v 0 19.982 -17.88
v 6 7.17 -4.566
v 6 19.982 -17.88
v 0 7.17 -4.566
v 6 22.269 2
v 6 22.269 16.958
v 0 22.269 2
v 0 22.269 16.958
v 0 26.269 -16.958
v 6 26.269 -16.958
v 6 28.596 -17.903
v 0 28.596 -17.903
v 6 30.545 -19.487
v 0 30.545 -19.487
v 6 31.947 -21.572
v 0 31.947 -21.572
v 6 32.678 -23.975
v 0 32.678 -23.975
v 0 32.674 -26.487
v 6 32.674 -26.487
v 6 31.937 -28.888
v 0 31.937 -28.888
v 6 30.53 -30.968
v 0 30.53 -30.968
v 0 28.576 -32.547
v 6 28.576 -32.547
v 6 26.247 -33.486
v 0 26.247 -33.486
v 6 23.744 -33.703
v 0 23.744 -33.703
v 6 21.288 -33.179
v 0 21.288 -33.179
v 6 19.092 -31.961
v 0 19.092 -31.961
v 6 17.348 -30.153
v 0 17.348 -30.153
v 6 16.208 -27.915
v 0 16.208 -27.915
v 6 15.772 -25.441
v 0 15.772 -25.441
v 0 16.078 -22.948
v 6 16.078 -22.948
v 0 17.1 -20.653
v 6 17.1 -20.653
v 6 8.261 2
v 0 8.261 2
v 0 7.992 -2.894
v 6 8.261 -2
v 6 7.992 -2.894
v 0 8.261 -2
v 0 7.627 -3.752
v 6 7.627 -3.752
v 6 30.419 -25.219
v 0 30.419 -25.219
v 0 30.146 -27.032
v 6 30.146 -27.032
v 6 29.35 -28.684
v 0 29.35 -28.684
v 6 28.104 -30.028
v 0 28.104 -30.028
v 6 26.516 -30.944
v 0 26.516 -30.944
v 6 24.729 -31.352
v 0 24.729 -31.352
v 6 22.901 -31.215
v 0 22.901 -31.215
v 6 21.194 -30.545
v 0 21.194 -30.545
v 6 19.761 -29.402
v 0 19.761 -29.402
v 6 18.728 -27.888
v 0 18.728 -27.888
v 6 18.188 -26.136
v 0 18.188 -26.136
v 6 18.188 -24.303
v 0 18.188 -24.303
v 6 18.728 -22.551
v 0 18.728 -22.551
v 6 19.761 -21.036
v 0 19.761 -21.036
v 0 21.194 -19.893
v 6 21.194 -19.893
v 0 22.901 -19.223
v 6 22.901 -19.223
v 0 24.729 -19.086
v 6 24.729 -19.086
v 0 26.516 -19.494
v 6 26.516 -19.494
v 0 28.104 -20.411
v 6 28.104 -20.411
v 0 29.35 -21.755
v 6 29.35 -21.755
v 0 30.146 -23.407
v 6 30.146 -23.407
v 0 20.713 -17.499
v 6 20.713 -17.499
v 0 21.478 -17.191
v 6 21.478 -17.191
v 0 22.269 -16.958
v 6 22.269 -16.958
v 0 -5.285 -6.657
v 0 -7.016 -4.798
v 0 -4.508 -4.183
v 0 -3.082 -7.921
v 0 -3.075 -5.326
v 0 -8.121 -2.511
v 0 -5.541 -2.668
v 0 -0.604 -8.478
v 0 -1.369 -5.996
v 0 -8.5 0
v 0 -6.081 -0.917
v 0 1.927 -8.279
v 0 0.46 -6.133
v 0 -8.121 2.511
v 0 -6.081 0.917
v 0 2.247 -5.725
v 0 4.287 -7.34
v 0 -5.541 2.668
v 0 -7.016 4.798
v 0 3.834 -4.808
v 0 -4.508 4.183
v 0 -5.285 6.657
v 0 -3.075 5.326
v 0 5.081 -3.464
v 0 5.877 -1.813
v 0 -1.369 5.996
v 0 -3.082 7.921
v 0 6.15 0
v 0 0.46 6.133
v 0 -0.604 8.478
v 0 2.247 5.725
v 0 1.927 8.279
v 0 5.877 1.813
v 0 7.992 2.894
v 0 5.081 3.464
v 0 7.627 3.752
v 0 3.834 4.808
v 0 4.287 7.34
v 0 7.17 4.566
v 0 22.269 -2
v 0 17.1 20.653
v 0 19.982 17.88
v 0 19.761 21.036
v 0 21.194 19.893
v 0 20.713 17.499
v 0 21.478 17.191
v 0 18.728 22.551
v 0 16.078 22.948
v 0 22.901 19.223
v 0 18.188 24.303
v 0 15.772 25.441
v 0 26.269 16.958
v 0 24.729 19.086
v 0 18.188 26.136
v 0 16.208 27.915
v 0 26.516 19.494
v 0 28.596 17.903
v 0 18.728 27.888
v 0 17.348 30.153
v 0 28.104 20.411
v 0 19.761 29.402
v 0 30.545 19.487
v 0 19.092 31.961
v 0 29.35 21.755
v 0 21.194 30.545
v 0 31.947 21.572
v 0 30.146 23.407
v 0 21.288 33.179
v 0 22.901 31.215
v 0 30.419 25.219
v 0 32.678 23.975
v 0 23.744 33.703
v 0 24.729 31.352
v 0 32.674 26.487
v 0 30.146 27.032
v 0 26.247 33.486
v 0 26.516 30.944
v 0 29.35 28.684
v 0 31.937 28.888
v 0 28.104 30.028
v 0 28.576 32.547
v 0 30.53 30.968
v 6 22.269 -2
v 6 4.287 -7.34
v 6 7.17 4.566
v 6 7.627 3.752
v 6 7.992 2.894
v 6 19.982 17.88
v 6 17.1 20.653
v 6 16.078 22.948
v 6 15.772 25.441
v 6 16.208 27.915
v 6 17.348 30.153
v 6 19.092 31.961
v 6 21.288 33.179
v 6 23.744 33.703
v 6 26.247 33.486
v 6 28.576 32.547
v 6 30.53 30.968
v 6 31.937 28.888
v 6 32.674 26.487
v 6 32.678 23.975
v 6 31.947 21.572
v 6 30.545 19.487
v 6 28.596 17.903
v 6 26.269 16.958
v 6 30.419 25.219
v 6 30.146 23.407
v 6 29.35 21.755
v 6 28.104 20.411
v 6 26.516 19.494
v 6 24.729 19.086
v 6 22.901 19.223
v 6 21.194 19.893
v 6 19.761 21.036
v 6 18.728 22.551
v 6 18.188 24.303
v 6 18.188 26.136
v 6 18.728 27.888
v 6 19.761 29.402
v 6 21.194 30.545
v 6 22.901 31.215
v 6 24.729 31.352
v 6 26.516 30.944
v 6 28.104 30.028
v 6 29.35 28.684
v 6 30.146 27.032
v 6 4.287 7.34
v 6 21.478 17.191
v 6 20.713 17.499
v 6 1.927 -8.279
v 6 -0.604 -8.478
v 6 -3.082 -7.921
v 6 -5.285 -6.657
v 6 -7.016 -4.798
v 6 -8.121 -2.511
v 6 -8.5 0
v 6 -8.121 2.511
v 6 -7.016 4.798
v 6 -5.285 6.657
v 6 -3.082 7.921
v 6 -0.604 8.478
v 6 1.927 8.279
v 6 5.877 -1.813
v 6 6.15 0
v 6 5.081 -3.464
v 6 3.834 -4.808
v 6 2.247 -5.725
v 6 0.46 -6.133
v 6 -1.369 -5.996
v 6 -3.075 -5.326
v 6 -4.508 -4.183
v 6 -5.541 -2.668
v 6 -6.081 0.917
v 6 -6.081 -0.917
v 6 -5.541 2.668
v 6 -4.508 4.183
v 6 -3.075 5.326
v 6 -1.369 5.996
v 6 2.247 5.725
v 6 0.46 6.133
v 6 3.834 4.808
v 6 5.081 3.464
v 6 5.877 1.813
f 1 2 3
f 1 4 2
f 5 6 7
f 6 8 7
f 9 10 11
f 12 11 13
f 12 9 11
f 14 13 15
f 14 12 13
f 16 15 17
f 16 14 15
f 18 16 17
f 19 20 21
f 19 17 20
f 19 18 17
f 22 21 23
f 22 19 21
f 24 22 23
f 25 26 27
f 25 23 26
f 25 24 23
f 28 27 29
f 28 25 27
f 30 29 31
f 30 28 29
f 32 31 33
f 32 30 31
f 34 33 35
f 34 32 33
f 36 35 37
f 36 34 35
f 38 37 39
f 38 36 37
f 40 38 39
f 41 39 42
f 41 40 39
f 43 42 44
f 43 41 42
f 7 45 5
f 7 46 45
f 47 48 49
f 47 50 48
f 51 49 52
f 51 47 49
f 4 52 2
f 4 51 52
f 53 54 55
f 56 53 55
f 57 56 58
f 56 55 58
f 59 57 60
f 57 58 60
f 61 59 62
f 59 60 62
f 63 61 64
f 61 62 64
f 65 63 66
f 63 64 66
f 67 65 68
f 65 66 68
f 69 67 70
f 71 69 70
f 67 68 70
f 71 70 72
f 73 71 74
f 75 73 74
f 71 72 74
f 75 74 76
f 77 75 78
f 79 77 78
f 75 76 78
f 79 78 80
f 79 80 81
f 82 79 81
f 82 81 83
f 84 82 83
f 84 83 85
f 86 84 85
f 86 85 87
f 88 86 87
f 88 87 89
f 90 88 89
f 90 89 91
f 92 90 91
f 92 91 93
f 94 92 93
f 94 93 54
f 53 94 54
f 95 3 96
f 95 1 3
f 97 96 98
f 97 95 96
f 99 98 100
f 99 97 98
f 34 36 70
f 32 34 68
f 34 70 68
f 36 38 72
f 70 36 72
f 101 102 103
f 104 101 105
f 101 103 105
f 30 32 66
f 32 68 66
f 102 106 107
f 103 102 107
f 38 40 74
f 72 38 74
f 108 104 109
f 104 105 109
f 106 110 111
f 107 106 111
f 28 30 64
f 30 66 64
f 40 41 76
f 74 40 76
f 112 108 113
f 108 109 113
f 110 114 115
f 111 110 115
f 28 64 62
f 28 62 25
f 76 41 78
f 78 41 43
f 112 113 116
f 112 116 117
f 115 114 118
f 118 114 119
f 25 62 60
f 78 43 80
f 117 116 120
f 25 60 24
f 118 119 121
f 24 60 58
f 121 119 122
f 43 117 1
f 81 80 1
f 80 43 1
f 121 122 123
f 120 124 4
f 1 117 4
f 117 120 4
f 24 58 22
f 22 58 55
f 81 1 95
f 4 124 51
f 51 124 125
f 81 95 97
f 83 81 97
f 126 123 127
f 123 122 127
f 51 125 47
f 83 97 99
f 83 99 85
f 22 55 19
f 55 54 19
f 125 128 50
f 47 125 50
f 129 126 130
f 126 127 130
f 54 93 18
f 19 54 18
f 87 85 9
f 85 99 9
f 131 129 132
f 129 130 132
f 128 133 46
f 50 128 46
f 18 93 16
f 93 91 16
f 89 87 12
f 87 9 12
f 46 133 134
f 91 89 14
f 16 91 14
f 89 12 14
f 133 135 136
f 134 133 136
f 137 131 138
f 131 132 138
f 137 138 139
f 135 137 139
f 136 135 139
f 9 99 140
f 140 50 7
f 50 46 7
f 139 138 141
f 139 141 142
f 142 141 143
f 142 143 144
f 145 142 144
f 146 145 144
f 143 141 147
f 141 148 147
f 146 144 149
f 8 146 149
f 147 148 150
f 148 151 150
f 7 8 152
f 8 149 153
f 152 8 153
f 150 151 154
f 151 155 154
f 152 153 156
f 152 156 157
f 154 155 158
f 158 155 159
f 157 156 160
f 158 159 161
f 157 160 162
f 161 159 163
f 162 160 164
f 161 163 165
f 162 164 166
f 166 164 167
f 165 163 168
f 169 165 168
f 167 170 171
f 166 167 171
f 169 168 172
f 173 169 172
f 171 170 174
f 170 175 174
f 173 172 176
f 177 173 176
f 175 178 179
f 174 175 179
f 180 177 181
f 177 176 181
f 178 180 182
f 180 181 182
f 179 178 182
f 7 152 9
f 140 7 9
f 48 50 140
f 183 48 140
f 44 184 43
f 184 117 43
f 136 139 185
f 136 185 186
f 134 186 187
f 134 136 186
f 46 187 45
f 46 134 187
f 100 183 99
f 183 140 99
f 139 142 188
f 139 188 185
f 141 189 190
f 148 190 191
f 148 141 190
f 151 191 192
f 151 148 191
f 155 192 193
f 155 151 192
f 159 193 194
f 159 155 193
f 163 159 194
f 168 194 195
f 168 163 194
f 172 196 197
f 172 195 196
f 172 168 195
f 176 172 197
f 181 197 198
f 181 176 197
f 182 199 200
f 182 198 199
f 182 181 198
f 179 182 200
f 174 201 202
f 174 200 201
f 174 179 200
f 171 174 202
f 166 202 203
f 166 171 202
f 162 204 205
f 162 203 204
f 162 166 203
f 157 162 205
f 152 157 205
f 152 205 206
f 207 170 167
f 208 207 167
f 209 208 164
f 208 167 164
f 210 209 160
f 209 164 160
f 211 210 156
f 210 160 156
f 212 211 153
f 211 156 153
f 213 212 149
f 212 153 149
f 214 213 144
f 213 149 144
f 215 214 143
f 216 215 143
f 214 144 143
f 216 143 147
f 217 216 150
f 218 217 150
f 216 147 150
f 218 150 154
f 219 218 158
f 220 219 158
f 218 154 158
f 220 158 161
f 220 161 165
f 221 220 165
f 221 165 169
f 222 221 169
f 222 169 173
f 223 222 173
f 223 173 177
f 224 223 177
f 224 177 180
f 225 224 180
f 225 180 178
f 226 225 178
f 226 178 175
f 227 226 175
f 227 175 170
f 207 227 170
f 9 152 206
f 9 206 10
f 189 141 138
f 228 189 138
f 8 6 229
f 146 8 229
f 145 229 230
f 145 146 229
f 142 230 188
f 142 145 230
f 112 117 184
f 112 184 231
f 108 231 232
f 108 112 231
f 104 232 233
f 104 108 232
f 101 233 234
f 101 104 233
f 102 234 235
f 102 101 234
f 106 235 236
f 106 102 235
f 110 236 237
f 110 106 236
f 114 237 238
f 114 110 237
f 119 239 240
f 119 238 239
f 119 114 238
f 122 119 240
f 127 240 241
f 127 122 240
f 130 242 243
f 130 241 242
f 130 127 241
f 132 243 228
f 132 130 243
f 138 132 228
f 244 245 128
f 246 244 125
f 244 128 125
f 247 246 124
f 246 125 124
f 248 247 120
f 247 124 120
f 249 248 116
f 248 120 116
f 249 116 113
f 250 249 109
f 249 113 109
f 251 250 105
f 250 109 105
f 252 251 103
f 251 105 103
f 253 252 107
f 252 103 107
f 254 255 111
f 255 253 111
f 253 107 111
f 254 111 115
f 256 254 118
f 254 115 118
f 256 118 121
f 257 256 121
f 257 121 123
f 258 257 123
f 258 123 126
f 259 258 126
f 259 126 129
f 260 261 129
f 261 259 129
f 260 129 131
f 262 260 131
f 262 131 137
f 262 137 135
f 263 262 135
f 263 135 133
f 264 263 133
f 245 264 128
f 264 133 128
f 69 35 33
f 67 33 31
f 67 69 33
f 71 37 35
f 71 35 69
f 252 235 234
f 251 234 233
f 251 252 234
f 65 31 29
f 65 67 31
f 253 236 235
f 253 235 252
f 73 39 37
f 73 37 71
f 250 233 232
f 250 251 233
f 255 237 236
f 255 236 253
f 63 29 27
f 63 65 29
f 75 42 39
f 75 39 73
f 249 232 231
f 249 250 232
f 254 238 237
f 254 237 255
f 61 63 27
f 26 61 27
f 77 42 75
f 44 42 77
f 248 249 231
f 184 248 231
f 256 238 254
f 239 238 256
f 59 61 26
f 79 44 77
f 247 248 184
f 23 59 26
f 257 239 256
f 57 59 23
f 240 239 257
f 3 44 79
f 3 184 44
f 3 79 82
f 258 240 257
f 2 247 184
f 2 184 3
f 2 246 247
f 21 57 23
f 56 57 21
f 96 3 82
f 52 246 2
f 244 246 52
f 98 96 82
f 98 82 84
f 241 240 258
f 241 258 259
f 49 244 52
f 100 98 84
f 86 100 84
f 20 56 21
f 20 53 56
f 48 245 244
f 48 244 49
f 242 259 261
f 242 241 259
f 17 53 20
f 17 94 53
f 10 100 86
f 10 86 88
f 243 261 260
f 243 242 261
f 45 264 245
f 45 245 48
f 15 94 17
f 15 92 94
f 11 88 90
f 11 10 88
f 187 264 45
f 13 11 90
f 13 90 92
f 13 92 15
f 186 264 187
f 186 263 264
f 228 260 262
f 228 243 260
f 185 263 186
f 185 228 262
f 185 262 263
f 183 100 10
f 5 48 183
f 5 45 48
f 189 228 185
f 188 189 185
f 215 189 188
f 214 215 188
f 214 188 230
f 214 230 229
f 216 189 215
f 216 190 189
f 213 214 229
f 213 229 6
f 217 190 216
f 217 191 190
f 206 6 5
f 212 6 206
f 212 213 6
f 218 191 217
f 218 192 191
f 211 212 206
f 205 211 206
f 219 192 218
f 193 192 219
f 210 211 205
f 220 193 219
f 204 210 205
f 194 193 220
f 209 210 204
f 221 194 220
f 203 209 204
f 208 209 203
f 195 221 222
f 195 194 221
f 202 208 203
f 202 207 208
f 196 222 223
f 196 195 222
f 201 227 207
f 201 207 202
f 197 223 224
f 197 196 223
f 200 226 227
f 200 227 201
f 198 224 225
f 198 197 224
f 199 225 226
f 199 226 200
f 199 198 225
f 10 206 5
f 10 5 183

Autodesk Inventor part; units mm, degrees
ref_plane "YZ Plane" through (0, 0, 0) normal (1, 0, 0) x (0, 1, 0)
ref_plane "XZ Plane" through (0, 0, 0) normal (0, 1, 0) x (-1, 0, 0)
ref_plane "XY Plane" through (0, 0, 0) normal (0, 0, 1) x (1, 0, 0)
sketch "草圖1" plane through (0, 0, 0) normal (1, 0, 0) x (0, 1, 0)
  line L0 (0, 0) -> (24.2691, 25.2193)
  line L1 (24.2691, 25.2193) -> (24.2691, -25.2193)
  line L2 (24.2691, -25.2193) -> (0, 0)
  line L3 (0, 0) -> (24.2691, 0)
  circle A0 centre (24.2691, 25.2193) radius 6.15
  circle A1 centre (24.2691, -25.2193) radius 6.15
  circle A2 centre (0, 0) radius 6.15
  circle A3 centre (24.2691, 25.2193) radius 8.5
  circle A4 centre (24.2691, -25.2193) radius 8.5
  circle A5 centre (0, 0) radius 8.5
  line L4 (26.2691, 16.9579) -> (26.2691, -16.9579)
  line L5 (22.2691, 16.9579) -> (22.2691, -16.9579)
  line L6 (17.0995, 20.6534) -> (4.2873, 7.3395)
  line L7 (4.2873, -7.3395) -> (17.0995, -20.6534)
  line L8 (19.9817, 17.8798) -> (7.1695, 4.5659)
  line L9 (7.1695, -4.5659) -> (19.9817, -17.8798)
  line L10 (8.2614, 2) -> (24.2691, 2)
  line L11 (8.2614, -2) -> (24.2691, -2)
  point P0 (22.2691, 2)
  point P1 (22.2691, -2)
  dimension "d0" = 92.2
  dimension "d1" = 35
  dimension "d2" = 35
  dimension "d3" = 12.3
  dimension "d4" = 17
  dimension "d5" = 2
  dimension "d6" = 2
  dimension "d7" = 2
  dimension "d8" = 2
  dimension "d9" = 2
  dimension "d10" = 2
  dimension "d13" = 2
  dimension "d14" = 2
extrude "擠出1" add sketch "草圖1" along normal blind 6 contours A2 L2 A5 L0 | L0 A5 L3 A2 | A2 L3 A5 L2 | A5 L6 A3 L0 | L0 A3 L8 A5 | A5 L9 A4 L2 | L2 A4 L7 A5 | A5 L10 L5 L3 | L3 L5 L11 A5 | A3 L1 A0 L0 | L0 A0 L1 A3 | A4 L1 A1 L2 | L2 A1 L1 A4 | L5 L10 L1 L3 | L3 L1 L11 L5 | L1 A3 L4 A4 | L5 A3 L1 L10 | L11 L1 A4 L5
equation "\"d6\" = d5"
equation "\"d7\" = d5"
equation "\"d8\" = d5"
equation "\"d9\" = d5"
equation "\"d10\" = d5"
equation "\"d13\" = d5"
equation "\"d14\" = d5"
properties part number "TriangleLink_CBF" material "ABS 塑膠"
